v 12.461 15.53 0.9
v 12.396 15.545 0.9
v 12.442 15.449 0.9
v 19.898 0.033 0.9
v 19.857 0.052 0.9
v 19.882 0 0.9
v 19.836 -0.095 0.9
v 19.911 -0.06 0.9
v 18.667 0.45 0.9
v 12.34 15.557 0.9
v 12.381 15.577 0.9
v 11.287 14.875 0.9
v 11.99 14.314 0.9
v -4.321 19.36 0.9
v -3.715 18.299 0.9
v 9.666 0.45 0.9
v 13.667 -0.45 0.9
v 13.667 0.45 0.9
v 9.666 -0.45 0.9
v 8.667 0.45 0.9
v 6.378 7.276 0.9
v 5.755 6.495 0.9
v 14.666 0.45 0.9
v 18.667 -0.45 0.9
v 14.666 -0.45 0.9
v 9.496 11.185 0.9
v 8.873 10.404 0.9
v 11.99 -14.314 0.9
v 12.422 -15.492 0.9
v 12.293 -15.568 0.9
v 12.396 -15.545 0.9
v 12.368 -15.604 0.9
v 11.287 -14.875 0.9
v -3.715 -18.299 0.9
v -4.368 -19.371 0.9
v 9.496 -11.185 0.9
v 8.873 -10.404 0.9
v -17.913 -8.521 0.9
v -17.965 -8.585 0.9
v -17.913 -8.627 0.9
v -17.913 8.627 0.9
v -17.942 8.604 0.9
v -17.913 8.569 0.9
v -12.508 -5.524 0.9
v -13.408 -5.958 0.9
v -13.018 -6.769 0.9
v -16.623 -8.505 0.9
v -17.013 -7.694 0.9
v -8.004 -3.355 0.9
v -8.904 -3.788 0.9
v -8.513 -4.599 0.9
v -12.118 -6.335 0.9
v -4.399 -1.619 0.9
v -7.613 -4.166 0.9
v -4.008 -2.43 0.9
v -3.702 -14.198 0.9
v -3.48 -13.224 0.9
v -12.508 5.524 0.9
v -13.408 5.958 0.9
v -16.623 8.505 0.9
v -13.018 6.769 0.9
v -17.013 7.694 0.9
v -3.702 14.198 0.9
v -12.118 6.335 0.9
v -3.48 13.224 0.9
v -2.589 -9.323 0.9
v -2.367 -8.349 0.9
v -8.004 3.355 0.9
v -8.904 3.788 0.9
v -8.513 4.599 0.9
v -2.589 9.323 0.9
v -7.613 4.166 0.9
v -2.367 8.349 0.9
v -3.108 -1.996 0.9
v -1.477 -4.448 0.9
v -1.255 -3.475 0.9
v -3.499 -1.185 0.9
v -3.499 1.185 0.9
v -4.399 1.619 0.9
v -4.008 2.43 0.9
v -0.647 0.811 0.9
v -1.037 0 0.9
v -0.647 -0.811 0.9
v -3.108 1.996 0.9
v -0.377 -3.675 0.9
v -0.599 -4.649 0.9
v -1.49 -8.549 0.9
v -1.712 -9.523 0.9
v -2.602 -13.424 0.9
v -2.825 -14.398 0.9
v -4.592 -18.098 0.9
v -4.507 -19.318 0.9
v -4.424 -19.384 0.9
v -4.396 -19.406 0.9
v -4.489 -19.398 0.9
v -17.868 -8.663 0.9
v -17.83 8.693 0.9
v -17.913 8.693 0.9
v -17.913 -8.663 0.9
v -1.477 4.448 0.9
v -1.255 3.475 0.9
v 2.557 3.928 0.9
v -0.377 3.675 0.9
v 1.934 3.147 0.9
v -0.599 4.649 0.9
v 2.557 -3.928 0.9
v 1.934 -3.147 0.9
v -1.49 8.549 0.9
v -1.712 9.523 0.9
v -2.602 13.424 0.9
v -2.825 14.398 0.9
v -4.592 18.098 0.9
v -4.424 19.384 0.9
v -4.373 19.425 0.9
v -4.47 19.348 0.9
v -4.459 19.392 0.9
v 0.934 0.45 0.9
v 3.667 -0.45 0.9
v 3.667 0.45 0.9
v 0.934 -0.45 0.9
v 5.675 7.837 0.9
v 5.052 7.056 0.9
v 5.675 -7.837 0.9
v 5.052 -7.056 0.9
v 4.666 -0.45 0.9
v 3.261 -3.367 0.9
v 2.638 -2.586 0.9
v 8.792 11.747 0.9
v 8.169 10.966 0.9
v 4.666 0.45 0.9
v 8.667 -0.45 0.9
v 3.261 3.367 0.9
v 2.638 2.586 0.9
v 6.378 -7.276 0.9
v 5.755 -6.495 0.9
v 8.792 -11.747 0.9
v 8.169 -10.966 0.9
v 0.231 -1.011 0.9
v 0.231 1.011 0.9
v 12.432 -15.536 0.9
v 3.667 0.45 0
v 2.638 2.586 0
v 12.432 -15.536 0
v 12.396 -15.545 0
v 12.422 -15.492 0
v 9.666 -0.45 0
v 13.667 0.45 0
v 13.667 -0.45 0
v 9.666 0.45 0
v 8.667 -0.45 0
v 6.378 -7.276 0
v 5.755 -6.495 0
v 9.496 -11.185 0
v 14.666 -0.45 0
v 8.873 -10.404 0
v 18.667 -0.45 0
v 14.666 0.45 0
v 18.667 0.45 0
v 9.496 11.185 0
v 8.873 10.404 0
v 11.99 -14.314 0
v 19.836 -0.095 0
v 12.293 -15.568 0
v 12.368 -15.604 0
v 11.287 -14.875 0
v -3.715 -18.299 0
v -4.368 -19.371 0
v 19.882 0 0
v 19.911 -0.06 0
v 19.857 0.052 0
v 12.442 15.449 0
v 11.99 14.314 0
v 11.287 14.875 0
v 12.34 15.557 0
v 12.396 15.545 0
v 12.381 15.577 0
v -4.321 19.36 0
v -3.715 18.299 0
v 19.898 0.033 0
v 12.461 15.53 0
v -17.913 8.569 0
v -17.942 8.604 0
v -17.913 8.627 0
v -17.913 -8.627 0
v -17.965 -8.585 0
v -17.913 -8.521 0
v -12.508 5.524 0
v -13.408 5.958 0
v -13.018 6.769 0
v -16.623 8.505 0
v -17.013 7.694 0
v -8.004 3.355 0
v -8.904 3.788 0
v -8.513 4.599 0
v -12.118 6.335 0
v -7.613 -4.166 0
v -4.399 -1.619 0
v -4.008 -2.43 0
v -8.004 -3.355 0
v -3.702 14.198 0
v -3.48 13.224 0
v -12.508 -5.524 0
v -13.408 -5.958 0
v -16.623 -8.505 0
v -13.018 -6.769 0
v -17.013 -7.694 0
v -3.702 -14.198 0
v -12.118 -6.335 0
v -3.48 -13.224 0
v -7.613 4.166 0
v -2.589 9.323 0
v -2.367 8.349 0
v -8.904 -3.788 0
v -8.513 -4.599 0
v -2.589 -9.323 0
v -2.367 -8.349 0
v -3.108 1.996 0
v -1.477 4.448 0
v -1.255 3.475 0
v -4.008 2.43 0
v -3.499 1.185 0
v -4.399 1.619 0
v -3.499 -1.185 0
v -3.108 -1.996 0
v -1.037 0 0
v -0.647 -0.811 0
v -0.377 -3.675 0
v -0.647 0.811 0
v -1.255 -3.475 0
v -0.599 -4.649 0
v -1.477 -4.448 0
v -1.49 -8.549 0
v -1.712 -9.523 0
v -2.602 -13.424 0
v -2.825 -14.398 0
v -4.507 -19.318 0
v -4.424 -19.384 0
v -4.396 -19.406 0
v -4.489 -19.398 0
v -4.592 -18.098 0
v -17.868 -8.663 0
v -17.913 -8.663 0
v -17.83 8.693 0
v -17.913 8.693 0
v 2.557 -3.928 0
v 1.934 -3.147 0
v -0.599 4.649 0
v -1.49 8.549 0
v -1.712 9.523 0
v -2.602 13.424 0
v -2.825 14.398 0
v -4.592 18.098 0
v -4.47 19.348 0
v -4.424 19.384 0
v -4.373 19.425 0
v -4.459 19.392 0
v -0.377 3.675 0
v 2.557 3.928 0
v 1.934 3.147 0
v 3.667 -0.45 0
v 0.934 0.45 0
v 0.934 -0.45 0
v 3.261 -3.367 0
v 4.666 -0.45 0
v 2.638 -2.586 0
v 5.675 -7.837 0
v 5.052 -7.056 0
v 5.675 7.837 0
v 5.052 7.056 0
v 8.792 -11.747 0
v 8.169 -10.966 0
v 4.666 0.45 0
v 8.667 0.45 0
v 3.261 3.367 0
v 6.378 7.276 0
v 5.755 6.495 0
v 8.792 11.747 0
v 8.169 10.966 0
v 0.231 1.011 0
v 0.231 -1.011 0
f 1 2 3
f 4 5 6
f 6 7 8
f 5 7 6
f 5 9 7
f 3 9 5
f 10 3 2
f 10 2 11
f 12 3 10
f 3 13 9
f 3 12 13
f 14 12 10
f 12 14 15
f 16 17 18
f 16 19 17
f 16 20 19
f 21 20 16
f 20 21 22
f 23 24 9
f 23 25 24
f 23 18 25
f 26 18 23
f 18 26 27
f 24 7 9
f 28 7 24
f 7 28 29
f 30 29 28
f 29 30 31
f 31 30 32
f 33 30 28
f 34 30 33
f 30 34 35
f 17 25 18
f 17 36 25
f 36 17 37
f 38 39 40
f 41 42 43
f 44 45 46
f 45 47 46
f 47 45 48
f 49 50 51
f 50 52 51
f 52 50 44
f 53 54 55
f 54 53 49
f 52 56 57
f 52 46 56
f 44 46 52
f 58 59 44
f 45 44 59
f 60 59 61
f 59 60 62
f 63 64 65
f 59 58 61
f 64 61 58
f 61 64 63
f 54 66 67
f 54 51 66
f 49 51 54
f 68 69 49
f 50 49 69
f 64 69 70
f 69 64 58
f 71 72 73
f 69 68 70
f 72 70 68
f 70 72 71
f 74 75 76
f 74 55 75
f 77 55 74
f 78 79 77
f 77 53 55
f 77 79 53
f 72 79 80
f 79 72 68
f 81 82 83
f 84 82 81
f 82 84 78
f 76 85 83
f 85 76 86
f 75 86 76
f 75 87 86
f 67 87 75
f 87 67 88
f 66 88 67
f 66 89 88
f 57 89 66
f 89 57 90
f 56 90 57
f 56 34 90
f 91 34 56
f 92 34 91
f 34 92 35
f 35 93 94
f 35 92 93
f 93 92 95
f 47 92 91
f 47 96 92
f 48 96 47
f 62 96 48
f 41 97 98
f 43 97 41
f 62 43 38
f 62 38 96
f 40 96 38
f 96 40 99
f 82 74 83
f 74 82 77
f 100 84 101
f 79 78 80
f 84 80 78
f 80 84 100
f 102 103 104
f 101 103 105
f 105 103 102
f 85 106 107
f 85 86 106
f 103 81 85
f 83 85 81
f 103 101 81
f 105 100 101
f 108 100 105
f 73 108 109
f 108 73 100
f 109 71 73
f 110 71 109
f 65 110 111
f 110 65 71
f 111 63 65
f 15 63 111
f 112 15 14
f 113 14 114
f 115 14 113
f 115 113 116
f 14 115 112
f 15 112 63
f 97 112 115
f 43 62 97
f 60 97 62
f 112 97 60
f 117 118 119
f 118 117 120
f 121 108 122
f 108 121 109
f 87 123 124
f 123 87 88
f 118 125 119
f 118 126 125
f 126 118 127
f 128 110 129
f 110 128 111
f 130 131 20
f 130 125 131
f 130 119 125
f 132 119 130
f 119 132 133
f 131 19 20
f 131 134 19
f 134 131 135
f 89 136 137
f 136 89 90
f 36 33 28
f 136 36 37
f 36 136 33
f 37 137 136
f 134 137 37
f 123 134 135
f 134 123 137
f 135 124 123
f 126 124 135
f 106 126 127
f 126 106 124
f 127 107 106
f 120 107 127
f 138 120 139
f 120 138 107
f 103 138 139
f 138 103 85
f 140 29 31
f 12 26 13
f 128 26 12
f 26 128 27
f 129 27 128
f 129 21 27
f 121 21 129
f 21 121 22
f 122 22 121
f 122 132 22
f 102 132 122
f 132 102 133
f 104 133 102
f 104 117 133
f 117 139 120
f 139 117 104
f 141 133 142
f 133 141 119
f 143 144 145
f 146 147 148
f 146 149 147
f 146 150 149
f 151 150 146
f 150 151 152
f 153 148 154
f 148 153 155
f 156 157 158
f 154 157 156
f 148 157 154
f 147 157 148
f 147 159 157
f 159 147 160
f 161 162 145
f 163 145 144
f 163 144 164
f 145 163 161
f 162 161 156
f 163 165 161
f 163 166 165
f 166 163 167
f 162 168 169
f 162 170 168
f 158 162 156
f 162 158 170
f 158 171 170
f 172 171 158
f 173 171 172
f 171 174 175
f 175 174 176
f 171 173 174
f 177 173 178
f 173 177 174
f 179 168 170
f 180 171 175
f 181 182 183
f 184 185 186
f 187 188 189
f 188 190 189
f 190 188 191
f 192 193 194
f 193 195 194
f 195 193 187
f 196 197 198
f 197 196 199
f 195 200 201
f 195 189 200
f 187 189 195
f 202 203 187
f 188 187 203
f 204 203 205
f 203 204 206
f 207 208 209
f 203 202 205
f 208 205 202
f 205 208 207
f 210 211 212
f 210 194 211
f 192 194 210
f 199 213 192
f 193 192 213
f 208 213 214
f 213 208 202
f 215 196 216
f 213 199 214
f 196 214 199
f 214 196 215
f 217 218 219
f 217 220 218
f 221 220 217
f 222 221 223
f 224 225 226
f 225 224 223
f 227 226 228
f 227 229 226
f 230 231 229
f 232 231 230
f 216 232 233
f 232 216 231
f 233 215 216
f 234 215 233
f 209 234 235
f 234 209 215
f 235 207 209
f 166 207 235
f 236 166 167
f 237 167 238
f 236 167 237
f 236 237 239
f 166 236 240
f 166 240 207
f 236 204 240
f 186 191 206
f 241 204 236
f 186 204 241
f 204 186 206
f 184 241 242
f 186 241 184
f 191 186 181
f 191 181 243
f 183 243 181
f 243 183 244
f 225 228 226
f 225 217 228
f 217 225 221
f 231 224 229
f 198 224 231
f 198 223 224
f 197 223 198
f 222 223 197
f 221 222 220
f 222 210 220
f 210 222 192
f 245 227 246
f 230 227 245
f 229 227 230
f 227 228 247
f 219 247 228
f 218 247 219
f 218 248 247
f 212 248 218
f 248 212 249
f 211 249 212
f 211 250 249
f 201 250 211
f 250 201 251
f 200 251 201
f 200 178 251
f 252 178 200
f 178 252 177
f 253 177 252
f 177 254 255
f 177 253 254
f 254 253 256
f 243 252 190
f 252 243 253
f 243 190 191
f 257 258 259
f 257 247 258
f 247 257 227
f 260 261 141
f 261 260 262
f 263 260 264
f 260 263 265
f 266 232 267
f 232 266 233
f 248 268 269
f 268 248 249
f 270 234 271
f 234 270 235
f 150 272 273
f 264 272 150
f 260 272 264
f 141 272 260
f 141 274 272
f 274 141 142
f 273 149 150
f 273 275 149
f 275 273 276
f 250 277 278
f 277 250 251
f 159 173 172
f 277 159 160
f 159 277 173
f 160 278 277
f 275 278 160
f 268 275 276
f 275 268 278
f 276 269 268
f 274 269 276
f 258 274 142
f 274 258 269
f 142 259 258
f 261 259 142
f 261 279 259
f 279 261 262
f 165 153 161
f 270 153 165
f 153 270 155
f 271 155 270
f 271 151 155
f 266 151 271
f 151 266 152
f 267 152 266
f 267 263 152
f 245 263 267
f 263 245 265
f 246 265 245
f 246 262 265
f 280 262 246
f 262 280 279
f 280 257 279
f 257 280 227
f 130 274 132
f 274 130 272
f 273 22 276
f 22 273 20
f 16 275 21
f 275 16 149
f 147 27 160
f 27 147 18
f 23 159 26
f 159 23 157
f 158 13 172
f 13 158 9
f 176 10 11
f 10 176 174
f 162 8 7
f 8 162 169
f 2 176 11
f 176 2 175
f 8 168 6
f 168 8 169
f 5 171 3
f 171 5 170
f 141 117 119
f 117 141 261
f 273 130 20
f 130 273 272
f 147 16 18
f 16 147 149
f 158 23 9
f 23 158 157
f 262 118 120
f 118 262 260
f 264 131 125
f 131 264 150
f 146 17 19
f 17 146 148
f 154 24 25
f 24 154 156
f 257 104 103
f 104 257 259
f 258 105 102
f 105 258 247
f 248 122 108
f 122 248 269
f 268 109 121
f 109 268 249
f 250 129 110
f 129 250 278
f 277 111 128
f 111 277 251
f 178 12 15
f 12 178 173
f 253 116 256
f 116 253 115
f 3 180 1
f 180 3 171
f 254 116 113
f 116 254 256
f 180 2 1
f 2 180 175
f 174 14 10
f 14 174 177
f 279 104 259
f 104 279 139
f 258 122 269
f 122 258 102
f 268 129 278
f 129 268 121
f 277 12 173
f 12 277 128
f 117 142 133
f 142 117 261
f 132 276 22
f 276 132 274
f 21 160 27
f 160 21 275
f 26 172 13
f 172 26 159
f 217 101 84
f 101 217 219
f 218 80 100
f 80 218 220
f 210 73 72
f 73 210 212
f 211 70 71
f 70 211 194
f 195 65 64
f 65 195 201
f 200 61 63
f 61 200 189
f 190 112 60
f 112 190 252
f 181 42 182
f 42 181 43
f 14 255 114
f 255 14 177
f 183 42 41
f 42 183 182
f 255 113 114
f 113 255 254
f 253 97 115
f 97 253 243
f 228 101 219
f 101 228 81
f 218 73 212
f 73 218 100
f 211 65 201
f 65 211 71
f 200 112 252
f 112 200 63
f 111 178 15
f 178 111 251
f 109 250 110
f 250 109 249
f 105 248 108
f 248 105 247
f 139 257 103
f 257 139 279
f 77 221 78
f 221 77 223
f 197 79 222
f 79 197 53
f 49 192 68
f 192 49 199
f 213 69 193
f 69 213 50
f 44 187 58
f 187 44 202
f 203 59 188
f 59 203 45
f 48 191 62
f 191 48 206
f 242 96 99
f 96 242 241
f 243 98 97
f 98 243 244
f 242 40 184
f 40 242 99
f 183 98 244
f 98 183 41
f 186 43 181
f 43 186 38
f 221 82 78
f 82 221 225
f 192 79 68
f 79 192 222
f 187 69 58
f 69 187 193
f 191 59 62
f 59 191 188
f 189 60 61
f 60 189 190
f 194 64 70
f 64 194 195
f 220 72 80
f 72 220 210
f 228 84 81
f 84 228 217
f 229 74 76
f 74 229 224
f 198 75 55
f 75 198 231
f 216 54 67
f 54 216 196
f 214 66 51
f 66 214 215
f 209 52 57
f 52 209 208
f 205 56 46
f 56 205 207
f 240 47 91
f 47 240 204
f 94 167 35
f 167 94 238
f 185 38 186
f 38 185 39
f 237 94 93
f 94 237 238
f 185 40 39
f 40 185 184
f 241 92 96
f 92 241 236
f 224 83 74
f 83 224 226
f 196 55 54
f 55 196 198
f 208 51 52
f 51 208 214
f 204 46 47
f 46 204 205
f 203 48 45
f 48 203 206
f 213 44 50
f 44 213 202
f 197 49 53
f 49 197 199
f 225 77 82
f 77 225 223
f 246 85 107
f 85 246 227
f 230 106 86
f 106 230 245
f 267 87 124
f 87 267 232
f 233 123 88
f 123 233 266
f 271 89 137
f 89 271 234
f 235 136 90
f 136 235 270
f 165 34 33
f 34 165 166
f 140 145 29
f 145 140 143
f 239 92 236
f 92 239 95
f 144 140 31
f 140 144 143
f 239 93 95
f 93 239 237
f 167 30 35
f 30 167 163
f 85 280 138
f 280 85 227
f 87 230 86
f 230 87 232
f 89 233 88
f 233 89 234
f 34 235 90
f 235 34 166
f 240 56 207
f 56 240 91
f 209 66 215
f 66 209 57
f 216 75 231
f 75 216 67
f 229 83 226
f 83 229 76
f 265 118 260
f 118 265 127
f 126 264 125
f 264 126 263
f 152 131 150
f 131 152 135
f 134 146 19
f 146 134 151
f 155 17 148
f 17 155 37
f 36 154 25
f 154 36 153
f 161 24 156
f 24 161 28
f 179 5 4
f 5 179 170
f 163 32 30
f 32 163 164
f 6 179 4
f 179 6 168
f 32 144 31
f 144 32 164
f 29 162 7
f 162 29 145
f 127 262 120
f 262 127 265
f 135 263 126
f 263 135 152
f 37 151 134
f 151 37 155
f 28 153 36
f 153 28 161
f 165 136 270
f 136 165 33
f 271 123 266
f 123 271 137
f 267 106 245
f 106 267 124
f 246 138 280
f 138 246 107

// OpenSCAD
module web(prongs, stakes, line_width, radius, height) {
	riblength = 2 * radius * sin(180 / prongs);
	for(prong = [0:prongs]) {
		rotate([0, 0, prong / prongs * 360]) {
			translate([-line_width / 2, -line_width / 2, 0]) {
				cube([radius, line_width, height]);
				for(stake = [1:stakes]) {
					translate([radius * stake / stakes - line_width / 2, 0, 0]) {
						rotate([0, 0, 180 / prongs]) {
							cube([line_width, riblength * stake / stakes, height]);
						}
					}
				}
			}
		}
	}
}

//web(prongs=7, stakes=4, line_width=0.5, radius=20, height=0.9);
web(prongs=7, stakes=4, line_width=0.9, radius=20, height=0.9);
